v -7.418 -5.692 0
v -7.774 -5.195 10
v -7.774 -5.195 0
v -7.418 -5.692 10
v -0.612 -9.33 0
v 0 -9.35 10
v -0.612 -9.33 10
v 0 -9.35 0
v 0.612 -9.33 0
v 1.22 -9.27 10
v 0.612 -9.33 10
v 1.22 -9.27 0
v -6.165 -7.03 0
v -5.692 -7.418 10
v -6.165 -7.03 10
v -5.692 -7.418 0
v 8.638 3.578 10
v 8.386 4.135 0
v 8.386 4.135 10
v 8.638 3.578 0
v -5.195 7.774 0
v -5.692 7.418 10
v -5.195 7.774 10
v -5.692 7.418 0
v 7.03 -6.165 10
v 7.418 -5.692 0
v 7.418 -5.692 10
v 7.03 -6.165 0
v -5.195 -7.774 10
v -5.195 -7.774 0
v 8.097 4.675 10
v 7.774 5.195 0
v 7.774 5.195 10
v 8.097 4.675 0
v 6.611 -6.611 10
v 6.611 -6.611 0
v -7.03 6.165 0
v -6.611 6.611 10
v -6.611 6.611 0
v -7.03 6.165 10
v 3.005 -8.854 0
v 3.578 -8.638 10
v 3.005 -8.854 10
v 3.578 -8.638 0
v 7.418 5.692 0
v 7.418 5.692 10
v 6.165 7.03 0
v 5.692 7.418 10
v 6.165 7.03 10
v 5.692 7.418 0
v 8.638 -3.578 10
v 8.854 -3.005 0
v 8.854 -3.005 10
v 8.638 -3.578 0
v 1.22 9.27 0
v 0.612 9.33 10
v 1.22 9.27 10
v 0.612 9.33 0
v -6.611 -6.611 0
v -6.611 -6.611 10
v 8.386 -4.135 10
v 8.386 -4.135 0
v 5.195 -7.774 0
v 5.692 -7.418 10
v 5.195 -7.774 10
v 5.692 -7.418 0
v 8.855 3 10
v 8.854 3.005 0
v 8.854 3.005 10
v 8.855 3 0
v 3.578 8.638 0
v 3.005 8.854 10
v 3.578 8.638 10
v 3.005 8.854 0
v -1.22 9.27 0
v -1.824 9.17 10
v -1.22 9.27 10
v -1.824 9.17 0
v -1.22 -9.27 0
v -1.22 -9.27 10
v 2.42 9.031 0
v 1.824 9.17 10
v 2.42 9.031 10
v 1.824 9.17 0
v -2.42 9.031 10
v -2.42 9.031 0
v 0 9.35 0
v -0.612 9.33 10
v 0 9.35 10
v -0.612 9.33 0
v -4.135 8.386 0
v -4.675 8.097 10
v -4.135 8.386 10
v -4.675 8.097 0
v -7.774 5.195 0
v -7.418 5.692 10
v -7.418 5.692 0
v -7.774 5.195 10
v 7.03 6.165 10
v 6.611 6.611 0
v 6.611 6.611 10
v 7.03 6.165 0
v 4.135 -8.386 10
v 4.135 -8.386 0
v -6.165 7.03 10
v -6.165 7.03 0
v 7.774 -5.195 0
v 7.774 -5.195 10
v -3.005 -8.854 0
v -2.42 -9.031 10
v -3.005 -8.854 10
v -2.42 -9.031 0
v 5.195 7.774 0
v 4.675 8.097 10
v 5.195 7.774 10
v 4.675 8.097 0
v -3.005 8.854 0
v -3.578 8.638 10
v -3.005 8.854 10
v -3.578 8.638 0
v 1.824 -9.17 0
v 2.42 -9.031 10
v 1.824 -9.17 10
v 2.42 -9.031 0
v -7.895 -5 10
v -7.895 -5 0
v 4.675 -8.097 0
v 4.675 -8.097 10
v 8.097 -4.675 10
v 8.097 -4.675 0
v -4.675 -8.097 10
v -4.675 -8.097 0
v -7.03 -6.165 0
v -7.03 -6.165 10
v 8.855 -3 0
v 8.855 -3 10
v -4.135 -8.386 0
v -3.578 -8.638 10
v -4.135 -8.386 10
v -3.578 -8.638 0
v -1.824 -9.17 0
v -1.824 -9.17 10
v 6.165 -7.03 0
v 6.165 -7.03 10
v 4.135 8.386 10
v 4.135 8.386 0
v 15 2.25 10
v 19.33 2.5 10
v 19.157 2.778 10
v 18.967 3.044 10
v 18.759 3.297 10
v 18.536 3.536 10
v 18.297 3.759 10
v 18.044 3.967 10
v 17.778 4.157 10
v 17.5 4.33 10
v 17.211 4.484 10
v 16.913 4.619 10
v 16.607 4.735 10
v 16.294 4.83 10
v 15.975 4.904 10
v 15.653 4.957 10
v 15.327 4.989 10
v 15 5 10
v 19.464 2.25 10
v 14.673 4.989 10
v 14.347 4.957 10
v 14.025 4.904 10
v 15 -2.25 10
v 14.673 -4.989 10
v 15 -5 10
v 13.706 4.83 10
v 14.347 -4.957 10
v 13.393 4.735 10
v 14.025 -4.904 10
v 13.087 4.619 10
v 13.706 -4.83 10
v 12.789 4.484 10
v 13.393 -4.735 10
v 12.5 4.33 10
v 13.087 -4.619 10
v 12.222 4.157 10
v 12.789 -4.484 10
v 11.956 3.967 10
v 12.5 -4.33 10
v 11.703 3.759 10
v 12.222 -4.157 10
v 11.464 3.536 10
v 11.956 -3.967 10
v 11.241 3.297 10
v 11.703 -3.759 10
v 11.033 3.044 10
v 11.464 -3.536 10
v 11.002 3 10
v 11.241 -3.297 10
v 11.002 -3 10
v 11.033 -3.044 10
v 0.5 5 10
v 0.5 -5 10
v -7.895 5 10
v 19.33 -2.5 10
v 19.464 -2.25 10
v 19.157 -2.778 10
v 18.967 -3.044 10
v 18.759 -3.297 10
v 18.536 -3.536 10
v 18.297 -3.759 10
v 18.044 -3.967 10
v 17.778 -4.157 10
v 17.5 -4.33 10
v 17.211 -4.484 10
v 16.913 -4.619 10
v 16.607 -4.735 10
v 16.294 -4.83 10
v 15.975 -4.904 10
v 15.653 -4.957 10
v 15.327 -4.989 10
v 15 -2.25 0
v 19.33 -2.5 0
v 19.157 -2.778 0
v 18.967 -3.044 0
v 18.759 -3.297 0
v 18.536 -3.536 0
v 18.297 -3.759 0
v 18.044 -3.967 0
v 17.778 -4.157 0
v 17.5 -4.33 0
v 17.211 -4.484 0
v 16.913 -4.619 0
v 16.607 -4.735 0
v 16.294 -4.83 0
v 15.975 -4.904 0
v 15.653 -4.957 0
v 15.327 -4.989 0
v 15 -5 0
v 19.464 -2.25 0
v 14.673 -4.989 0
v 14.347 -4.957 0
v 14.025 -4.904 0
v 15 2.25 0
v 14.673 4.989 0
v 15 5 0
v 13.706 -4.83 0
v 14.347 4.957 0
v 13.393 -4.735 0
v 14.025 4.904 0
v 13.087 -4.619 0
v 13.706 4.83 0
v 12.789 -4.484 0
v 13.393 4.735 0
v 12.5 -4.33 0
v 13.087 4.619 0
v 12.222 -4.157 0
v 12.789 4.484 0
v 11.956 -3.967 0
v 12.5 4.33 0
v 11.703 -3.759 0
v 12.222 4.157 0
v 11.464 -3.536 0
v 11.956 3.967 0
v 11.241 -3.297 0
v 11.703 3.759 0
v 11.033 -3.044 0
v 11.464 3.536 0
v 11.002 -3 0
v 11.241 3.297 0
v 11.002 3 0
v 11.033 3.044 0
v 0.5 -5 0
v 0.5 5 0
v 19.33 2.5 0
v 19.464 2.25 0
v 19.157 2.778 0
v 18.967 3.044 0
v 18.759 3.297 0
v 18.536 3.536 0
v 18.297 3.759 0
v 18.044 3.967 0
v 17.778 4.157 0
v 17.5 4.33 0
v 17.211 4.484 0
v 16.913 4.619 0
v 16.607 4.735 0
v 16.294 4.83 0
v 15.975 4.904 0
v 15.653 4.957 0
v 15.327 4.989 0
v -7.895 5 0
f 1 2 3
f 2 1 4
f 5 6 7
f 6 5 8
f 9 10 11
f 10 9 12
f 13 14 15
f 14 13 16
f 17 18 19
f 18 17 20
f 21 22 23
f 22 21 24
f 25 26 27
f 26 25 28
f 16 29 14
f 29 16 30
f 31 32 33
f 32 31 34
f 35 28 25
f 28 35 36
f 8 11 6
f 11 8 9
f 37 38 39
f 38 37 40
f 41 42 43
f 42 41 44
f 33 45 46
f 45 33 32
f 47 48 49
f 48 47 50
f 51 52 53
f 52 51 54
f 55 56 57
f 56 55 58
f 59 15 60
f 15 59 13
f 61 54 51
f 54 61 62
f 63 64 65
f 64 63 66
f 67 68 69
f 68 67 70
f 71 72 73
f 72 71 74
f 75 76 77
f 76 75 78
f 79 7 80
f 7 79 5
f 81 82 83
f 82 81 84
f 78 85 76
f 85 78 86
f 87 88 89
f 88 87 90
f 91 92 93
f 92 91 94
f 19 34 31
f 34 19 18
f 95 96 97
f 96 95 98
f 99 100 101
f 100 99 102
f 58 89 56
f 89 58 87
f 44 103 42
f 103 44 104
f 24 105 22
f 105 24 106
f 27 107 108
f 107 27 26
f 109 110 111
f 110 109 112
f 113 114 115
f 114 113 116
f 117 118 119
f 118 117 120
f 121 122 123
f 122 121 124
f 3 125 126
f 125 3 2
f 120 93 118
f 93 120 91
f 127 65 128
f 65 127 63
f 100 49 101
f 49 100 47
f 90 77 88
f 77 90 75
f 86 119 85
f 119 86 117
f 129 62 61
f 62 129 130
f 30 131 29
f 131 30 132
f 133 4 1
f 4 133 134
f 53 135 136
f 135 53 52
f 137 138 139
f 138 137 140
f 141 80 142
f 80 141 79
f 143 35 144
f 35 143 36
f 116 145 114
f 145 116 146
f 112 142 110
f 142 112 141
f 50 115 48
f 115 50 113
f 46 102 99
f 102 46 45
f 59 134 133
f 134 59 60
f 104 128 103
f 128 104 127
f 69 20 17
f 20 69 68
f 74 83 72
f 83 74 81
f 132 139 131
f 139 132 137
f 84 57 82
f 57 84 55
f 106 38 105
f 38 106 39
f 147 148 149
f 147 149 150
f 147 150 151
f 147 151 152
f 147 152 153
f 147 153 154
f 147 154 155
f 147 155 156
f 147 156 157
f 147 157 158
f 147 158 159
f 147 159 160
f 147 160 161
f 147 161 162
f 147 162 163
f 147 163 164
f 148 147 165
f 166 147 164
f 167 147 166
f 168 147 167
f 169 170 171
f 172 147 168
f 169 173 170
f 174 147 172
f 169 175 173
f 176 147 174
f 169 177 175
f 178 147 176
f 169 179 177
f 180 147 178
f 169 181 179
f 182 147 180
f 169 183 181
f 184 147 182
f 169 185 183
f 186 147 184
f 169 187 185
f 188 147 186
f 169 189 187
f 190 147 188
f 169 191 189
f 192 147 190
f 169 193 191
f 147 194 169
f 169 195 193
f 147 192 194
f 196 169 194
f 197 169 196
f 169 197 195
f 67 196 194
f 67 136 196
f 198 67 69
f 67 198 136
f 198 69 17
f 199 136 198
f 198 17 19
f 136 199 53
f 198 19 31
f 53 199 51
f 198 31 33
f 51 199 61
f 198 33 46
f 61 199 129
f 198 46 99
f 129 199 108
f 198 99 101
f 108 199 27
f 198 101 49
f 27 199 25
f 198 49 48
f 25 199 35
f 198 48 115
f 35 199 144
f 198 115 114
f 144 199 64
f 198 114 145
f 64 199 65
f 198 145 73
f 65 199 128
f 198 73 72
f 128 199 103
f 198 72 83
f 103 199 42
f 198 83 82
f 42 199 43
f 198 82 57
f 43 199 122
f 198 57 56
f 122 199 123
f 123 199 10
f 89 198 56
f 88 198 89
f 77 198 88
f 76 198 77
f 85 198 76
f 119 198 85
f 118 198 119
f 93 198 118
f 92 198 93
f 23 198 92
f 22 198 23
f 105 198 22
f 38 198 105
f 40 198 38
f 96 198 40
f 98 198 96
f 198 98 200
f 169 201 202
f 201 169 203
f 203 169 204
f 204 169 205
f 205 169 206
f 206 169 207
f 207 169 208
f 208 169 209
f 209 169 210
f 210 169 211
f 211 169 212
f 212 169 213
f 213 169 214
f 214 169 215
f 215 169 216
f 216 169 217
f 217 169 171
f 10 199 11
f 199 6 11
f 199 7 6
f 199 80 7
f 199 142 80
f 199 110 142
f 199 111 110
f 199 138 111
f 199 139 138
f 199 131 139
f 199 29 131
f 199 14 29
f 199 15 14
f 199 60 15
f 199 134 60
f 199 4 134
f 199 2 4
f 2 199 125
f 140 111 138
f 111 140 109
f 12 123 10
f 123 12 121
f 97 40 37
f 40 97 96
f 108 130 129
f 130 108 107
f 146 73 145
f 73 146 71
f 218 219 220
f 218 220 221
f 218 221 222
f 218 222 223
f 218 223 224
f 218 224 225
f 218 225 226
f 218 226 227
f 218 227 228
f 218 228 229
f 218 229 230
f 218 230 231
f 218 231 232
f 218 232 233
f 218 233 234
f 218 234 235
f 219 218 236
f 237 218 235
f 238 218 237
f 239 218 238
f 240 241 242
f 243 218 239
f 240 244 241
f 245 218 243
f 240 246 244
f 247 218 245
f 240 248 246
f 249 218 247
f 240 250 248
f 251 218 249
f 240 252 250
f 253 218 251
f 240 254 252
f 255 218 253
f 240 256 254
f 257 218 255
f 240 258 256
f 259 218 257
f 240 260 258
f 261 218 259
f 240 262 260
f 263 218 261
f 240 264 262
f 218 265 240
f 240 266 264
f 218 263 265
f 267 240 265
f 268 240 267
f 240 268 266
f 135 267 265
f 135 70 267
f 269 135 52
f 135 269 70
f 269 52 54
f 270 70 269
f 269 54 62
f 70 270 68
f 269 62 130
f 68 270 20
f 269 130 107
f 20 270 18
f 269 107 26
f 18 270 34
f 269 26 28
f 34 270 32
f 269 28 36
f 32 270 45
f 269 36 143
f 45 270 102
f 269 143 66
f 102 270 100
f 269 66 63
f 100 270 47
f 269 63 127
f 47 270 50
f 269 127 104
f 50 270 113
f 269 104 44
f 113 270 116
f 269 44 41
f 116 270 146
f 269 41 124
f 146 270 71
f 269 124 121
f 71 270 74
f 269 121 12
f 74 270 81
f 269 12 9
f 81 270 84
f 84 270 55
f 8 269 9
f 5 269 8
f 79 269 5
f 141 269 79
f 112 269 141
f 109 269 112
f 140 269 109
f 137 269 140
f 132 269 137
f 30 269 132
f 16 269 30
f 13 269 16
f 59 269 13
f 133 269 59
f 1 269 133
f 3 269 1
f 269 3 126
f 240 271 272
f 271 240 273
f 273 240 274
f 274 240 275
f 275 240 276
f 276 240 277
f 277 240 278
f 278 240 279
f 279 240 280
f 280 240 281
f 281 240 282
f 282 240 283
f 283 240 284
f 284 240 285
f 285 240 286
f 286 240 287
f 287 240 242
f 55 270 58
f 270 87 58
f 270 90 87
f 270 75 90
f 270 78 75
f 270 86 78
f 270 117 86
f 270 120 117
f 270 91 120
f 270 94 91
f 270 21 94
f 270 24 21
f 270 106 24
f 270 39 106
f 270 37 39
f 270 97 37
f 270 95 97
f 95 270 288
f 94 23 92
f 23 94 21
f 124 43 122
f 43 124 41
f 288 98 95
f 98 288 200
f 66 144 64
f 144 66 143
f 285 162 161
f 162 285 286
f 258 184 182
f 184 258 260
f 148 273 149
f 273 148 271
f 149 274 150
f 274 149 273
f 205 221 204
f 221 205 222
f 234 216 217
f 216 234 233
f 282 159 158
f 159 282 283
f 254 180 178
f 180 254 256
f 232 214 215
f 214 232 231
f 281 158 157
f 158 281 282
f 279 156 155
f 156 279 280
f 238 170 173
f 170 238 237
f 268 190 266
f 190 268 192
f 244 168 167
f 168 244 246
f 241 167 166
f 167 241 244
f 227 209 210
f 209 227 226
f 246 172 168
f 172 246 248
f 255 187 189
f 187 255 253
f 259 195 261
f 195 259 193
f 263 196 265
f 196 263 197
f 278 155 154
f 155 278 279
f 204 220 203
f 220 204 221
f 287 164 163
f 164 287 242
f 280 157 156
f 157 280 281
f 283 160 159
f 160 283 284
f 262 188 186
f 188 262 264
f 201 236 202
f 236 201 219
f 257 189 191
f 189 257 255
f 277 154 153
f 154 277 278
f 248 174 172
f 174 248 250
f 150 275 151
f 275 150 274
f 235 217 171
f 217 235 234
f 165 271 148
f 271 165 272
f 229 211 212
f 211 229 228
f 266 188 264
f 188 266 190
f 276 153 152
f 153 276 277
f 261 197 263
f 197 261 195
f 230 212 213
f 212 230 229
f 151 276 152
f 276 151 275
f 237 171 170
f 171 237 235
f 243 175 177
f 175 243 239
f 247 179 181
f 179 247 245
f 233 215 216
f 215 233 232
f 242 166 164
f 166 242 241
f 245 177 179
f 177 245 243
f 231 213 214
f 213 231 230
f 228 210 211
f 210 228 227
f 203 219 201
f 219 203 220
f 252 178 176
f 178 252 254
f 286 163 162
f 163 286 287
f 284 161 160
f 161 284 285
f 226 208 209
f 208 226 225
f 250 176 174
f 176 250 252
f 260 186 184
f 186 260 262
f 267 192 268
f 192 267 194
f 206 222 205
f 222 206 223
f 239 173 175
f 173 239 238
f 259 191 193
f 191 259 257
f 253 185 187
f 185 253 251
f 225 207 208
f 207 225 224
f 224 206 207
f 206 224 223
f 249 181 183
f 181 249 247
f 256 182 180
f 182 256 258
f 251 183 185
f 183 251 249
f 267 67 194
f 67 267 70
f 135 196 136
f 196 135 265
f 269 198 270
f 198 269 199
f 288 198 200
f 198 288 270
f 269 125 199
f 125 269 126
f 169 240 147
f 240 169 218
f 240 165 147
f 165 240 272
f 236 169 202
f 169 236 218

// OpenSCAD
// Tubing clip for a 12.7 mm (1/2 inch) lab stand rod
// Print orientation: flat on the bed, extruded upward in +Z

// ---------------- Parameters ----------------
rod_d        = 12.7;   // stand rod diameter
ring_w       = 3;      // rod ring wall thickness
ring_od      = rod_d + 2 * ring_w;  // rod ring outer diameter (18.7 mm)
ring_id      = rod_d;  // rod ring inner diameter (12.7 mm)

tub_d        = 6;      // tubing inner diameter
tub_w        = 2;      // tubing wall thickness
tub_od       = tub_d + 2 * tub_w;   // tubing outer diameter (10 mm)
tub_x        = 15;     // tubing ring centre X position

bridge_x0    = 8;      // bridge start (X)
bridge_x1    = 12;     // bridge end (X)
bridge_w     = 6;      // bridge width (Y)

opening_rod  = 10;     // rod ring opening width (Y), on -X side
opening_tub  = 4.5;    // tubing ring opening width (Y), on +X side

height       = 10;     // extrusion height (Z)

eps          = 0.5;    // cutter overshoot past faces

$fn = 96;

// ---------------- Model ----------------
difference() {
    union() {
        // Rod ring
        cylinder(d = ring_od, h = height);

        // Tubing ring
        translate([tub_x, 0, 0])
            cylinder(d = tub_od, h = height);

        // Solid bridge between the rings
        translate([bridge_x0, -bridge_w / 2, 0])
            cube([bridge_x1 - bridge_x0, bridge_w, height]);
    }

    // Rod ring opening: removes everything with x < 0 and -5 < y < 5
    translate([-ring_od - eps, -opening_rod / 2, -eps])
        cube([ring_od + 2 * eps, opening_rod, height + 2 * eps]);

    // Tubing ring opening: removes x > 15 and -2.25 < y < 2.25
    translate([tub_x, -opening_tub / 2, -eps])
        cube([ring_od + 2 * eps, opening_tub, height + 2 * eps]);
}
